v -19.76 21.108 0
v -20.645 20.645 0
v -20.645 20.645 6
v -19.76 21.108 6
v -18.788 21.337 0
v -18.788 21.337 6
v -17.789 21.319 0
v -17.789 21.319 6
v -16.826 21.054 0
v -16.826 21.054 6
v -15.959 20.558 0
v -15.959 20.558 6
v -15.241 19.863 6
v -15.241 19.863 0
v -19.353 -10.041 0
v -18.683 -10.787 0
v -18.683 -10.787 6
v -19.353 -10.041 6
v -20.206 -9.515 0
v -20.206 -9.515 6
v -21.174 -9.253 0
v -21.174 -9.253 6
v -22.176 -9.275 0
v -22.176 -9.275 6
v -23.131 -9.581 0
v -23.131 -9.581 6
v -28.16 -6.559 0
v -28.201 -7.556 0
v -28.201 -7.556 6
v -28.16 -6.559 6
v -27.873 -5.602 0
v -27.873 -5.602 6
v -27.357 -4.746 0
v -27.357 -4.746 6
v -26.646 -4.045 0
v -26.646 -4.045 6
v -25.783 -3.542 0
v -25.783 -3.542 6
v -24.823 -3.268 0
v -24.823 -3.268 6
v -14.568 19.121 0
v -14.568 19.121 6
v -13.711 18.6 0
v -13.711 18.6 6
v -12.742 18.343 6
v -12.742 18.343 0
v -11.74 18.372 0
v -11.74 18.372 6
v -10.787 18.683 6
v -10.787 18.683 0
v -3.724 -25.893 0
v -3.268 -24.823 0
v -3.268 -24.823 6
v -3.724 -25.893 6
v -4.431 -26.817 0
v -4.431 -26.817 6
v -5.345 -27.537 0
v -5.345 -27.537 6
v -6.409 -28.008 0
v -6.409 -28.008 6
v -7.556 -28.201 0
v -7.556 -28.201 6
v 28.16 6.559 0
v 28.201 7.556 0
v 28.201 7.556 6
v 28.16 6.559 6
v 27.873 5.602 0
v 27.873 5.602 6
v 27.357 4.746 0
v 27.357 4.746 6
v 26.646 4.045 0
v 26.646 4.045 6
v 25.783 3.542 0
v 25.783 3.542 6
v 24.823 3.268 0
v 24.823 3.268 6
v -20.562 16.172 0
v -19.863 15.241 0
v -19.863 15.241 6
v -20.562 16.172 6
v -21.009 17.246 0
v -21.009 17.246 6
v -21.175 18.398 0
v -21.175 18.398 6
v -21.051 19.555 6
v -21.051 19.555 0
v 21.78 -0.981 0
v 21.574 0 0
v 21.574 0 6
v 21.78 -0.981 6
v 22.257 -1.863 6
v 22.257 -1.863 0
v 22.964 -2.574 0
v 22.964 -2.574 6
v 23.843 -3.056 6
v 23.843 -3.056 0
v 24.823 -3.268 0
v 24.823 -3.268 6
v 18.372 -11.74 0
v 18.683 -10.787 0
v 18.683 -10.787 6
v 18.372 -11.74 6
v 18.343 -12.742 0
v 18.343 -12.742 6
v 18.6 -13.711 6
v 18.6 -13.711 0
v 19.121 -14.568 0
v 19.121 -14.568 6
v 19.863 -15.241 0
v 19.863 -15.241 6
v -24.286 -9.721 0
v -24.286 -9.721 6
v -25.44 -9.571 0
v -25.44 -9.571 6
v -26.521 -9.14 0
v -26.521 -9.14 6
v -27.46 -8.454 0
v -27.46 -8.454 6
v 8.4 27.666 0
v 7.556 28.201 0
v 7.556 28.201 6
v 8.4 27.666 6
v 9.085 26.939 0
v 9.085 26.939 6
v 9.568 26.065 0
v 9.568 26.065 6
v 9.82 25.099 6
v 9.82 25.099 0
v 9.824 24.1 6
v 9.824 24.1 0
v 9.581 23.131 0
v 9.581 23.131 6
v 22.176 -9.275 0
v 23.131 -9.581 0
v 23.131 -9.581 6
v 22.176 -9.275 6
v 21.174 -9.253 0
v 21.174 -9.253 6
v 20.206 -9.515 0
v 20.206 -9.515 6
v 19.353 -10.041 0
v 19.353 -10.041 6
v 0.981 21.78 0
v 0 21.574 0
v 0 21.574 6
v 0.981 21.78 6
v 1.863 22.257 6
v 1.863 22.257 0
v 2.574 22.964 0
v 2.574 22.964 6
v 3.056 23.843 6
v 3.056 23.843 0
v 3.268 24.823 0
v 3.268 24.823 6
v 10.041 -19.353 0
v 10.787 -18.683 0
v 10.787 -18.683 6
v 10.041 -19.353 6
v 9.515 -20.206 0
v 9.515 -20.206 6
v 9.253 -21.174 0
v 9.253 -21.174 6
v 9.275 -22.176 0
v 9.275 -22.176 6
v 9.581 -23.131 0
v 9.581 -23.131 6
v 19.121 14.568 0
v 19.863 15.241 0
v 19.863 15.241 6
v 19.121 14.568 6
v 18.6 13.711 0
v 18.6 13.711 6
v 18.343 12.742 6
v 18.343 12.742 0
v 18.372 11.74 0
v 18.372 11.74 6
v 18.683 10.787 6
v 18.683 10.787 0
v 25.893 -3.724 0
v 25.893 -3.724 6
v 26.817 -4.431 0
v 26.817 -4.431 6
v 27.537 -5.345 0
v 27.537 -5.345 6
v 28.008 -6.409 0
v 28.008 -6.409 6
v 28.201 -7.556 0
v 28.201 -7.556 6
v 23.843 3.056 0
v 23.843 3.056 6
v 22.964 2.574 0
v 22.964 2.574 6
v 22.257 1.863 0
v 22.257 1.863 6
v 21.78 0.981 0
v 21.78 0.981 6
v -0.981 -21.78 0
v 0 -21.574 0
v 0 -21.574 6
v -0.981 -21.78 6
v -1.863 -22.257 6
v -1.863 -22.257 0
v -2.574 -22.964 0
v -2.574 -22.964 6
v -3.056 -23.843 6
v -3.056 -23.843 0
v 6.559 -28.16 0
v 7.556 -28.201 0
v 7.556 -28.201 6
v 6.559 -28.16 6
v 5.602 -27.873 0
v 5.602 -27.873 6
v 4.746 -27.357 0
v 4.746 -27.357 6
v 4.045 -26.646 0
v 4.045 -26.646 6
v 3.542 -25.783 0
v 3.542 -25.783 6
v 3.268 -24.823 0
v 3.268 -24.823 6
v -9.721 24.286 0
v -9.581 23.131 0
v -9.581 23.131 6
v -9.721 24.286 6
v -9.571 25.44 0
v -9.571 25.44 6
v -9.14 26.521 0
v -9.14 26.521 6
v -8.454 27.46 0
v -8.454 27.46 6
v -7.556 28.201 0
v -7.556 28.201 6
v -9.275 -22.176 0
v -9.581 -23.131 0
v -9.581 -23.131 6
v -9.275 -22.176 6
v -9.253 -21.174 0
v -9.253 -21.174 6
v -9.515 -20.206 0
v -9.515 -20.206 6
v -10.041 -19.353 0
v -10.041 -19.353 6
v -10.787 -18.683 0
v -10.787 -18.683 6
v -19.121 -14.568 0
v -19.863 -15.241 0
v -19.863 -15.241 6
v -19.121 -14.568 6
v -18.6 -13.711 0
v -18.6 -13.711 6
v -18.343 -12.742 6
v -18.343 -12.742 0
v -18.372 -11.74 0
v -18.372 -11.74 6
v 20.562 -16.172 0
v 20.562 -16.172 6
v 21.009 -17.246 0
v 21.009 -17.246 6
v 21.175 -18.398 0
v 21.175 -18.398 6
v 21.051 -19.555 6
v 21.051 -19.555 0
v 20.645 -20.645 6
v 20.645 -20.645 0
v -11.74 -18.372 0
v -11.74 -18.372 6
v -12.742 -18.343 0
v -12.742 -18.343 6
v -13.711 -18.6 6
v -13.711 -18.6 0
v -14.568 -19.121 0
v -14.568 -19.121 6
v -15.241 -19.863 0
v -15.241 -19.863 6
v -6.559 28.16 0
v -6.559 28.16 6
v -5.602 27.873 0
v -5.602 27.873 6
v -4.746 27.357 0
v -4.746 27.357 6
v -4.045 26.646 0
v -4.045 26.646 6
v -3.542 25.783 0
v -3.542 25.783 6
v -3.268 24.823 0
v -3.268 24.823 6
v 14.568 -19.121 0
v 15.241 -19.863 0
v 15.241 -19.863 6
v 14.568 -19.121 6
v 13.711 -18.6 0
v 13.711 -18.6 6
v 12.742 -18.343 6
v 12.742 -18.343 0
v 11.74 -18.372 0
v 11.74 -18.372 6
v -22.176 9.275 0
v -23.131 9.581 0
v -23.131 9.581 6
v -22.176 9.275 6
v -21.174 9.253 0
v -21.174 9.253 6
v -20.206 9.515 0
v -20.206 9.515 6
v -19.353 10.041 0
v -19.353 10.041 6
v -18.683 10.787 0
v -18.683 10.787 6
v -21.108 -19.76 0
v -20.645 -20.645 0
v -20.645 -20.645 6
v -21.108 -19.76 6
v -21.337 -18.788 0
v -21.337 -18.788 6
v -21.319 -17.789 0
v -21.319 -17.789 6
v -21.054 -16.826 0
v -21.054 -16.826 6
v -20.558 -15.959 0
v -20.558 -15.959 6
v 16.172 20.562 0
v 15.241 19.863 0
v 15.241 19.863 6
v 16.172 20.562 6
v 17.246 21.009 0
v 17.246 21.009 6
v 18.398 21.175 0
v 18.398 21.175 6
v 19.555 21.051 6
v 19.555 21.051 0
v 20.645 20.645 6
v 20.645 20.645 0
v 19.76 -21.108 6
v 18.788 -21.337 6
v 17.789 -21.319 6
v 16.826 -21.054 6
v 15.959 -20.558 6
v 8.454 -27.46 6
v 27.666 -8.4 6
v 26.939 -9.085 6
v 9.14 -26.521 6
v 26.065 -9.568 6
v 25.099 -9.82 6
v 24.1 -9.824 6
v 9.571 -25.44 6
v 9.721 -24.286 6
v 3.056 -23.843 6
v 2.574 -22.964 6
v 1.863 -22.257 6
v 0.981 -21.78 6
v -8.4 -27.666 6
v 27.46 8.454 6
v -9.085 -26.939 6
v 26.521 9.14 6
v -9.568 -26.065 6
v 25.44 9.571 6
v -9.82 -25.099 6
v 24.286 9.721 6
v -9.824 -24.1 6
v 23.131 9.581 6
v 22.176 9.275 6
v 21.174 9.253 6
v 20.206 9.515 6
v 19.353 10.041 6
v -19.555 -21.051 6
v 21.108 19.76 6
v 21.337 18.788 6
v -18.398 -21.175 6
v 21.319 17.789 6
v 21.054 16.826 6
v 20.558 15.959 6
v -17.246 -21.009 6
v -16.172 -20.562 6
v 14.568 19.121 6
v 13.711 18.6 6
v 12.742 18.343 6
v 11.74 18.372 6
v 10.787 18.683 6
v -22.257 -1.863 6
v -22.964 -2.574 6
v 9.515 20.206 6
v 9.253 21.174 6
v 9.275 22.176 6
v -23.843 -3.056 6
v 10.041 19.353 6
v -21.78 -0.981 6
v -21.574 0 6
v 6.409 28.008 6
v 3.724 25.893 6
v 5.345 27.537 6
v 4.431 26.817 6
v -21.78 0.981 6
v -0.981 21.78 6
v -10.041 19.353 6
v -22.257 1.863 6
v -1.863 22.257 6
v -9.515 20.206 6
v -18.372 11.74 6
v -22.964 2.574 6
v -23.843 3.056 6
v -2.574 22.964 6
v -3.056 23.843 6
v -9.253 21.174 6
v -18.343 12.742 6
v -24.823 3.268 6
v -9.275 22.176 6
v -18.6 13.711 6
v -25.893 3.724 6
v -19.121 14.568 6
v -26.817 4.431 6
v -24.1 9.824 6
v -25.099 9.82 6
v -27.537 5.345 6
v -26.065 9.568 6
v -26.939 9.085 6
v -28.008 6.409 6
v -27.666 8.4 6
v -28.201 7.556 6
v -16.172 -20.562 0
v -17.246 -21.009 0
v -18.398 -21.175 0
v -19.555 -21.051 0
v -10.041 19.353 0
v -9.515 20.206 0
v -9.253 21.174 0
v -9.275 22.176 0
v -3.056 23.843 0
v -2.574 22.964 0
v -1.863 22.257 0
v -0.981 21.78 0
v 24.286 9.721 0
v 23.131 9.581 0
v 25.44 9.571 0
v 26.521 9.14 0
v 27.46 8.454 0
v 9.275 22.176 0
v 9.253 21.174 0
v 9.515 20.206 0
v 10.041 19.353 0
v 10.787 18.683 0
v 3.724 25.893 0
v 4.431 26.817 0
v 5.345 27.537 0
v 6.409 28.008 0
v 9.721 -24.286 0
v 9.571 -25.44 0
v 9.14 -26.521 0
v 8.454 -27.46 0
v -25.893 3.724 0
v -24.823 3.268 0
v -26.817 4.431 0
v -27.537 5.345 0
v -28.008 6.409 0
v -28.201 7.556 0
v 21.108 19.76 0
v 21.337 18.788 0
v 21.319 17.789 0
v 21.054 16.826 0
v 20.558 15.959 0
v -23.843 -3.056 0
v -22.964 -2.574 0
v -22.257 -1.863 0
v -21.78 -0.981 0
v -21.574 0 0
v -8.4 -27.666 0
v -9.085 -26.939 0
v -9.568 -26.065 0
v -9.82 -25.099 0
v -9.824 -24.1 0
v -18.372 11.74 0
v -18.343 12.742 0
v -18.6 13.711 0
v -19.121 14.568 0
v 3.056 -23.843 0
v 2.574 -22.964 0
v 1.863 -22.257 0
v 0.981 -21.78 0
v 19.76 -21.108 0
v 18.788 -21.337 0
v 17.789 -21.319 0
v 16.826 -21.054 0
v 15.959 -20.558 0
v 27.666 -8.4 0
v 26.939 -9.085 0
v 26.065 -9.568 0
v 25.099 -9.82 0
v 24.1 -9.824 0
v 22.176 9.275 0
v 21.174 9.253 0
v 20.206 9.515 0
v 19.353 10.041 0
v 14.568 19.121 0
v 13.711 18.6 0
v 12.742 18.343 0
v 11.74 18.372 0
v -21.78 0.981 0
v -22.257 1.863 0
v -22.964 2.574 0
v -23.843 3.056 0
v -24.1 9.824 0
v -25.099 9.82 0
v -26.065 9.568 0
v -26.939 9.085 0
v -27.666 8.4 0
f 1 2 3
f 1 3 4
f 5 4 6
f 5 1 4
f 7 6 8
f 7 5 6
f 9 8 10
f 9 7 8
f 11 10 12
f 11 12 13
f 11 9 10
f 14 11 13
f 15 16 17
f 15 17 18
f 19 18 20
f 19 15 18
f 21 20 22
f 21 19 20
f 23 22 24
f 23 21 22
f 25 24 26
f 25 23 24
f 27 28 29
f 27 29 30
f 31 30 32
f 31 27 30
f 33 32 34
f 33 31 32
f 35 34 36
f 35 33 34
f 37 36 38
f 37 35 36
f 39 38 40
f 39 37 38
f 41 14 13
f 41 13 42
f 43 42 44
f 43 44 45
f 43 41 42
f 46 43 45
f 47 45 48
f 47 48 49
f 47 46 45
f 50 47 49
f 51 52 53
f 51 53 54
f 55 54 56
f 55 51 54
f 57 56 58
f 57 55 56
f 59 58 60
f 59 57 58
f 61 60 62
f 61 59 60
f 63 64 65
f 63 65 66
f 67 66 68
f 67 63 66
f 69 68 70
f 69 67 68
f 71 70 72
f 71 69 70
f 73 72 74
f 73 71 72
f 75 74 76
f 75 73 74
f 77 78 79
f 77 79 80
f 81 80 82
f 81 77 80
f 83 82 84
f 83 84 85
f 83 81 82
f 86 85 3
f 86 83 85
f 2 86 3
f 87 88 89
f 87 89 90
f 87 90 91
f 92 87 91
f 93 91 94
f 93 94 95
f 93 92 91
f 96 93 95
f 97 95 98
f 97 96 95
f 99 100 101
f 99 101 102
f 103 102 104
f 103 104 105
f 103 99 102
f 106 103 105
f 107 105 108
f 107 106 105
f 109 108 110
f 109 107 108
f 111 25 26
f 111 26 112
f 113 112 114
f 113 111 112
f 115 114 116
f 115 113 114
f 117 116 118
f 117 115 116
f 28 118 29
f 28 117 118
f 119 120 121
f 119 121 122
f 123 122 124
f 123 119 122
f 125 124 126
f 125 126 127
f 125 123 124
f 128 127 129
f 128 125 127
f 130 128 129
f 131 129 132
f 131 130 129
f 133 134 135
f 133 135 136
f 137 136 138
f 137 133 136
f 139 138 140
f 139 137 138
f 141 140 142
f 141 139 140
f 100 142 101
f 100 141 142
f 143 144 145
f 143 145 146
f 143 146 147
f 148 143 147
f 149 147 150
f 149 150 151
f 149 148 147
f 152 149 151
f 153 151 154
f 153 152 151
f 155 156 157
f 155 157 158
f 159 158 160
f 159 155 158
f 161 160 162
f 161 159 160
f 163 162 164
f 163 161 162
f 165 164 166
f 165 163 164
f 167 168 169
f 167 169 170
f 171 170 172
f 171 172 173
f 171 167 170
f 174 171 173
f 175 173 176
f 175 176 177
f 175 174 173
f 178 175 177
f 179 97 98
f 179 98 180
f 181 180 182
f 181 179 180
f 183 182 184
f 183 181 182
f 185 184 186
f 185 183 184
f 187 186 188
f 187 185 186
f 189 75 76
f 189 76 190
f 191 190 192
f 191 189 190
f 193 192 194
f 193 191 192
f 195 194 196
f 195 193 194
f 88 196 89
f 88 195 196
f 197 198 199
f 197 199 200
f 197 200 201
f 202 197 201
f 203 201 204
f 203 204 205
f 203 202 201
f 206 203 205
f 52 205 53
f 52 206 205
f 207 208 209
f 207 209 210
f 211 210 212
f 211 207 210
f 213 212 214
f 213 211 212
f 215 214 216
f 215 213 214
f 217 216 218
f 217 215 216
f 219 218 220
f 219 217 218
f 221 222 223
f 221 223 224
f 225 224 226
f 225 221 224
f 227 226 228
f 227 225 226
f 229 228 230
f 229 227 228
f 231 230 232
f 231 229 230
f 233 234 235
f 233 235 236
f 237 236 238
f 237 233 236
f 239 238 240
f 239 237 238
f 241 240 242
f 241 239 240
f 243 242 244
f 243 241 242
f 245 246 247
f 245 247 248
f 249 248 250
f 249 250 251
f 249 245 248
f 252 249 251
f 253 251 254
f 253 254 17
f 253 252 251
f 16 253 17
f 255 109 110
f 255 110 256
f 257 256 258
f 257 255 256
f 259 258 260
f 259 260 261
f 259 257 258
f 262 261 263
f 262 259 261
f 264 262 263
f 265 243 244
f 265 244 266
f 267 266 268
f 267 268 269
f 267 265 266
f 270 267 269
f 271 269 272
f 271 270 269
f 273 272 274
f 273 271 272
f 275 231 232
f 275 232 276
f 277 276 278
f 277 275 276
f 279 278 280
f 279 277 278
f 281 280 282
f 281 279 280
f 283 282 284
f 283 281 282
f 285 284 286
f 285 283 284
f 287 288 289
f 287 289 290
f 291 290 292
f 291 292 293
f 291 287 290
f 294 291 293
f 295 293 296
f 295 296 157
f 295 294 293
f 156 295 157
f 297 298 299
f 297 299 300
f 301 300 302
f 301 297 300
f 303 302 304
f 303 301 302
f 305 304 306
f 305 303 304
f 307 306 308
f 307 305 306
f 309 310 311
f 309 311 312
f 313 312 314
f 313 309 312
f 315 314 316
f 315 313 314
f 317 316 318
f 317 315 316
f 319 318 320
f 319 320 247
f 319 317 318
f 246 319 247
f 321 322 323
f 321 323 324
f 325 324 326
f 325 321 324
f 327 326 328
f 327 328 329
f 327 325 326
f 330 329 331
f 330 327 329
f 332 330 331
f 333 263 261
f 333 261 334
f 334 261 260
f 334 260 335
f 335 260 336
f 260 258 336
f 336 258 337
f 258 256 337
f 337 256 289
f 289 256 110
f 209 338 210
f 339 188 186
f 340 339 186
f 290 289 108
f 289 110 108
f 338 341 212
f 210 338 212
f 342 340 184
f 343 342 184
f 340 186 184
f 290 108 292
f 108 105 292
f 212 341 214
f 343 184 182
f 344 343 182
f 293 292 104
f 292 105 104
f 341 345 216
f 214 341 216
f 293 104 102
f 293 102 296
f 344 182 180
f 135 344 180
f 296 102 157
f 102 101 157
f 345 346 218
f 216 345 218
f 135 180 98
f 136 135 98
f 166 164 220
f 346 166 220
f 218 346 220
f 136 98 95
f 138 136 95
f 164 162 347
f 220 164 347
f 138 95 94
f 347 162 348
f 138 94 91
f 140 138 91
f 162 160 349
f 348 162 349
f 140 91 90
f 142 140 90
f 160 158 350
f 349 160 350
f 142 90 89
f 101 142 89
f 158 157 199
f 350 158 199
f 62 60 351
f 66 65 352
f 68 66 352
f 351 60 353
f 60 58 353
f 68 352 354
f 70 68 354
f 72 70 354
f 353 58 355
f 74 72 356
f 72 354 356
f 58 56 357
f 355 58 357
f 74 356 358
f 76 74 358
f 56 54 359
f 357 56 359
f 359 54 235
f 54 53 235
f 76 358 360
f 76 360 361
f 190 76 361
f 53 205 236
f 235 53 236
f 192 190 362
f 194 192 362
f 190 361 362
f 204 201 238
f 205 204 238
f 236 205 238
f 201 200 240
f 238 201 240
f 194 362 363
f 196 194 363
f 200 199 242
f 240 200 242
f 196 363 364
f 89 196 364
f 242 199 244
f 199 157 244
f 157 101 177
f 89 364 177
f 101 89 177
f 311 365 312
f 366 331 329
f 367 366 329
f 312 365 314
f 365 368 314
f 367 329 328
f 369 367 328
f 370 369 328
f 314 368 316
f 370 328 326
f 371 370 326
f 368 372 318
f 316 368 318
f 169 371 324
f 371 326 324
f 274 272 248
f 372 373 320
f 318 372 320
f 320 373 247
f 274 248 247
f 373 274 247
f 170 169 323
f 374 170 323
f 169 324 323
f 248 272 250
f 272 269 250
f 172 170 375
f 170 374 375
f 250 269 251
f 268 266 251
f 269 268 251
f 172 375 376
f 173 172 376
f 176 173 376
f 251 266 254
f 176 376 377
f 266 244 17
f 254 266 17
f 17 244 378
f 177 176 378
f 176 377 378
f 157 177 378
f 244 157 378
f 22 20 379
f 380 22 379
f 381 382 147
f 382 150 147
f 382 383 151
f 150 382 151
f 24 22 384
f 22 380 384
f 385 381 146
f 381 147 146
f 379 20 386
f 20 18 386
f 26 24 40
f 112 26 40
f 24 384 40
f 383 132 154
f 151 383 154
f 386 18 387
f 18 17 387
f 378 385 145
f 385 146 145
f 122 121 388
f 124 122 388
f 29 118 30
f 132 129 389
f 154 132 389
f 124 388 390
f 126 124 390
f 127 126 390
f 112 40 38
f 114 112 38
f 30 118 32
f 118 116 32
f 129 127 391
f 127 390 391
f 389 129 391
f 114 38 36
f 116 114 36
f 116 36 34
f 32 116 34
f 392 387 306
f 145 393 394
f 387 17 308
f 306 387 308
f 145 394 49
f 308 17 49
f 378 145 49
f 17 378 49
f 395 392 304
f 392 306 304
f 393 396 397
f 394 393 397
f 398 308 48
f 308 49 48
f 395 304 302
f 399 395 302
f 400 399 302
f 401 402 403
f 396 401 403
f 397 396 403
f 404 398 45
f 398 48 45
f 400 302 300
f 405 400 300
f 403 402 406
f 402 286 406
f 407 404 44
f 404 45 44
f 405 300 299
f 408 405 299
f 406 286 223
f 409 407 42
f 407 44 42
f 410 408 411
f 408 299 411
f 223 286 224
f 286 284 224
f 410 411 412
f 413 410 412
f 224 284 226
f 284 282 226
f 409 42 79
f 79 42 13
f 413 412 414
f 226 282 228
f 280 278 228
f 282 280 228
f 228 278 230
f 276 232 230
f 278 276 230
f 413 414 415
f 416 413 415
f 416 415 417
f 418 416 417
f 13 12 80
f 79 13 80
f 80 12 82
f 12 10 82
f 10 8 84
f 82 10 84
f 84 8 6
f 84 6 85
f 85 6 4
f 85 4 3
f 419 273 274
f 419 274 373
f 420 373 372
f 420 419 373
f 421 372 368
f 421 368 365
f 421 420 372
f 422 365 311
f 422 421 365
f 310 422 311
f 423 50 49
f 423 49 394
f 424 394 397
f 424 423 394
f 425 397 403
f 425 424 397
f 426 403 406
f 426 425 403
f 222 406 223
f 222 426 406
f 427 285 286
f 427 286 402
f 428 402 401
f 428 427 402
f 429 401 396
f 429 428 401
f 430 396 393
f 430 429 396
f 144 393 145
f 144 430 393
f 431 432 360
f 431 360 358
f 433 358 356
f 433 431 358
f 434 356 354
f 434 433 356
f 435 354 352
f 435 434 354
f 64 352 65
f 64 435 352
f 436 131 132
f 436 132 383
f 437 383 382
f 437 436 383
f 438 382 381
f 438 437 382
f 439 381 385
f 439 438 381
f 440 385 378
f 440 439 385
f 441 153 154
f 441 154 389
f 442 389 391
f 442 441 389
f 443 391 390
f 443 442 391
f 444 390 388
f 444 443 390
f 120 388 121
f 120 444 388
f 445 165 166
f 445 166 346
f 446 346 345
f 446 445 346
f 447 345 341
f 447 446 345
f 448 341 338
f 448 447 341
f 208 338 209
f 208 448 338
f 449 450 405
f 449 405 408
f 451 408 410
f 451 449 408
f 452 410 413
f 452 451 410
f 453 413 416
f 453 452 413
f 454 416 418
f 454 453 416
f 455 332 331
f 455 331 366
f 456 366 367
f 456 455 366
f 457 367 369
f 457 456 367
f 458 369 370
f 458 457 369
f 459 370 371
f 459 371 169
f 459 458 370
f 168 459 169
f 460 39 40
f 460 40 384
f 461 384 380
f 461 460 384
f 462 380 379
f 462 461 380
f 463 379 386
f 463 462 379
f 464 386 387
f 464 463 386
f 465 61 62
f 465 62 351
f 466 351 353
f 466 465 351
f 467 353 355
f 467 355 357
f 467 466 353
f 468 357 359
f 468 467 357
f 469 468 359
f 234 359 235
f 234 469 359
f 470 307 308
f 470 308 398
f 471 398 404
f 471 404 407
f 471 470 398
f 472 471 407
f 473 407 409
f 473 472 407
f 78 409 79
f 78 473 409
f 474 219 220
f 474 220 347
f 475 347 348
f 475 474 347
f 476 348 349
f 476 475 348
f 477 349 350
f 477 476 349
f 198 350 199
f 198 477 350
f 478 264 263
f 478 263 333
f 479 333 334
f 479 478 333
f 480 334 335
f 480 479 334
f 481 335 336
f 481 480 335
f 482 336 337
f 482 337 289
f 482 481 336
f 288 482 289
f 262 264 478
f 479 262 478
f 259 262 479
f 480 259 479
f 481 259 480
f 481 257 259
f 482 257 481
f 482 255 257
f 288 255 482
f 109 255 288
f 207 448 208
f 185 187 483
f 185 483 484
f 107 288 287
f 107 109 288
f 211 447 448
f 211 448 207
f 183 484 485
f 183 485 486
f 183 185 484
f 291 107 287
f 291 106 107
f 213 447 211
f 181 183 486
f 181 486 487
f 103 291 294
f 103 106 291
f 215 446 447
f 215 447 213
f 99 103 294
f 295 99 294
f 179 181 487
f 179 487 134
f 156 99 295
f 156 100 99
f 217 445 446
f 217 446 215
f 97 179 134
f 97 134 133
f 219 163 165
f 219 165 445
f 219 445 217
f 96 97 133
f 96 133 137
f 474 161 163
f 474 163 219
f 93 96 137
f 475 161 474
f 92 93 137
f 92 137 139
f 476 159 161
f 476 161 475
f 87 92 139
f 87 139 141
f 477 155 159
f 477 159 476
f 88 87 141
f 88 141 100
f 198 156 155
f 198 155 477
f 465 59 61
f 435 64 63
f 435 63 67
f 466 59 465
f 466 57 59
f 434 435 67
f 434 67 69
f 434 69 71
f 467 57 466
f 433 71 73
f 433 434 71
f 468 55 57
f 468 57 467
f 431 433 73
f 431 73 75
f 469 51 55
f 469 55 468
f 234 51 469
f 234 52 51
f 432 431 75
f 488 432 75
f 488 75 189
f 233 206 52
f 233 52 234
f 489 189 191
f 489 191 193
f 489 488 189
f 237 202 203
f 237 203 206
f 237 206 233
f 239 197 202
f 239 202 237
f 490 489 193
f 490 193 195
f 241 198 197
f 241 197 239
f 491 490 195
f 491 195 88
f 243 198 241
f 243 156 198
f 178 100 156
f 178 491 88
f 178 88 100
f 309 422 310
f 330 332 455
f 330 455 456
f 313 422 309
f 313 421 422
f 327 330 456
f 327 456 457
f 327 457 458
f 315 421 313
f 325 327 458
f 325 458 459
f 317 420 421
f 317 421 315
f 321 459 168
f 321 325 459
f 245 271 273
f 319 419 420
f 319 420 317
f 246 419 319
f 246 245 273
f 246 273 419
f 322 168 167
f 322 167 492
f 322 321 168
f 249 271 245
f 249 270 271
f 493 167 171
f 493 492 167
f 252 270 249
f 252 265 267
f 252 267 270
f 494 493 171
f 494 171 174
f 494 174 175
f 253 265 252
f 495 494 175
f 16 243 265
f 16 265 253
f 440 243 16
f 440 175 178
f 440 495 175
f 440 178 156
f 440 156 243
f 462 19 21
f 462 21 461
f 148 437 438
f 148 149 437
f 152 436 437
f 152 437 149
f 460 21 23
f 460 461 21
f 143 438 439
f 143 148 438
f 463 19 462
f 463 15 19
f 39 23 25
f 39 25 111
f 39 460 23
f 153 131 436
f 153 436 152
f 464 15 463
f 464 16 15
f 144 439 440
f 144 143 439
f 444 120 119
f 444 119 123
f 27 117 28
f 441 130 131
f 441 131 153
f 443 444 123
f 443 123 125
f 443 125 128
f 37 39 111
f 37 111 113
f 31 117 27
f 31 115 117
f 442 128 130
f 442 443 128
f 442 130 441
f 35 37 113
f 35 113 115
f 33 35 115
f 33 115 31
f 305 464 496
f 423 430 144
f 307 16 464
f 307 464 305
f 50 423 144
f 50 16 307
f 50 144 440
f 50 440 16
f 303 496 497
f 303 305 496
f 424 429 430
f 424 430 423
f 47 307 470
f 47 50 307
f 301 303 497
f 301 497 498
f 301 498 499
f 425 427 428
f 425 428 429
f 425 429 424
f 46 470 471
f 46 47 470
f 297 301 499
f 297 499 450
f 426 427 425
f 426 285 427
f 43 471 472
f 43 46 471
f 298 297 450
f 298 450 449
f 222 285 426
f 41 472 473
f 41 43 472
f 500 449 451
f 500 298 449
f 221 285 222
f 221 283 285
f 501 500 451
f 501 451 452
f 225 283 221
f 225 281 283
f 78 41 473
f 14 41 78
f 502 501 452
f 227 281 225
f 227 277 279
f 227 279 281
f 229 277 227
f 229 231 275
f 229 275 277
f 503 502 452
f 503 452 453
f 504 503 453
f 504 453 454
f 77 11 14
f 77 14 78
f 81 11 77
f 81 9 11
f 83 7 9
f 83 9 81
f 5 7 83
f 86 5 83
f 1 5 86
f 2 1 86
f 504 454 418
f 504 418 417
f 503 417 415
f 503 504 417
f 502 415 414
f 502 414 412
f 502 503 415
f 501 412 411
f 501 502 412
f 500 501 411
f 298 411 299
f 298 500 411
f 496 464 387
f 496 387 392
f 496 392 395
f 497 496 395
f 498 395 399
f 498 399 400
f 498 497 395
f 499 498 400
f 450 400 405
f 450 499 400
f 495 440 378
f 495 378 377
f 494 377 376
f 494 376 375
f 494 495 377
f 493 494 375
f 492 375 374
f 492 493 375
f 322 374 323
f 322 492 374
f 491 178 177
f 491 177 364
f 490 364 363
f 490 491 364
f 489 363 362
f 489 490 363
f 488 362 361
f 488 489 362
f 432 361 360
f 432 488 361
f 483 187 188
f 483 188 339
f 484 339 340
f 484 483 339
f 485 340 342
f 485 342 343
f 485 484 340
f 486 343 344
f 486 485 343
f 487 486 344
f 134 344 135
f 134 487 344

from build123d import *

# Parameters (mm, degrees)
BOSS_EXTRUDE4_DEPTH = 6


with BuildPart() as part:
    # Sketch4 → Boss-Extrude4 (new body)
    with BuildSketch(Plane.XY):
        with BuildLine():
            ThreePointArc((0, 21.573833609), (2.244076515, 22.584556995), (3.267964856, 24.822657492))
            ThreePointArc((3.267964856, 24.822657492), (4.865501824, 27.205902748), (7.556485251, 28.201186884))
            ThreePointArc((7.556485251, 28.201186884), (9.568303086, 26.065235227), (9.581188162, 23.131034405))
            ThreePointArc((9.581188162, 23.131034405), (9.348851227, 20.680838348), (10.786916804, 18.683487962))
            ThreePointArc((10.786916804, 18.683487962), (13.235705768, 18.436761833), (15.24146933, 19.86306955))
            ThreePointArc((15.24146933, 19.86306955), (17.816599556, 21.128252), (20.644701633, 20.644701633))
            ThreePointArc((20.644701633, 20.644701633), (21.319011157, 17.789004319), (19.86306955, 15.24146933))
            ThreePointArc((19.86306955, 15.24146933), (18.436761833, 13.235705768), (18.683487962, 10.786916804))
            ThreePointArc((18.683487962, 10.786916804), (20.680838348, 9.348851227), (23.131034405, 9.581188162))
            ThreePointArc((23.131034405, 9.581188162), (25.993753825, 9.389303192), (28.201186884, 7.556485251))
            ThreePointArc((28.201186884, 7.556485251), (27.357307405, 4.74622407), (24.822657492, 3.267964856))
            ThreePointArc((24.822657492, 3.267964856), (22.584556995, 2.244076515), (21.573833609, 0))
            ThreePointArc((21.573833609, 0), (22.584556995, -2.244076515), (24.822657492, -3.267964856))
            ThreePointArc((24.822657492, -3.267964856), (27.205902748, -4.865501824), (28.201186884, -7.556485251))
            ThreePointArc((28.201186884, -7.556485251), (26.065235227, -9.568303086), (23.131034405, -9.581188162))
            ThreePointArc((23.131034405, -9.581188162), (20.680838348, -9.348851227), (18.683487962, -10.786916804))
            ThreePointArc((18.683487962, -10.786916804), (18.436761833, -13.235705768), (19.86306955, -15.24146933))
            ThreePointArc((19.86306955, -15.24146933), (21.128252, -17.816599556), (20.644701633, -20.644701633))
            ThreePointArc((20.644701633, -20.644701633), (17.789004319, -21.319011157), (15.24146933, -19.86306955))
            ThreePointArc((15.24146933, -19.86306955), (13.235705768, -18.436761833), (10.786916804, -18.683487962))
            ThreePointArc((10.786916804, -18.683487962), (9.348851227, -20.680838348), (9.581188162, -23.131034405))
            ThreePointArc((9.581188162, -23.131034405), (9.389303192, -25.993753825), (7.556485251, -28.201186884))
            ThreePointArc((7.556485251, -28.201186884), (4.74622407, -27.357307405), (3.267964856, -24.822657492))
            ThreePointArc((3.267964856, -24.822657492), (2.244076515, -22.584556995), (0, -21.573833609))
            ThreePointArc((0, -21.573833609), (-2.244076515, -22.584556995), (-3.267964856, -24.822657492))
            ThreePointArc((-3.267964856, -24.822657492), (-4.865501824, -27.205902748), (-7.556485251, -28.201186884))
            ThreePointArc((-7.556485251, -28.201186884), (-9.568303086, -26.065235227), (-9.581188162, -23.131034405))
            ThreePointArc((-9.581188162, -23.131034405), (-9.348851227, -20.680838348), (-10.786916804, -18.683487962))
            ThreePointArc((-10.786916804, -18.683487962), (-13.235705768, -18.436761833), (-15.24146933, -19.86306955))
            ThreePointArc((-15.24146933, -19.86306955), (-17.816599556, -21.128252), (-20.644701633, -20.644701633))
            ThreePointArc((-20.644701633, -20.644701633), (-21.319011157, -17.789004319), (-19.86306955, -15.24146933))
            ThreePointArc((-19.86306955, -15.24146933), (-18.436761833, -13.235705768), (-18.683487962, -10.786916804))
            ThreePointArc((-18.683487962, -10.786916804), (-20.680838348, -9.348851227), (-23.131034405, -9.581188162))
            ThreePointArc((-23.131034405, -9.581188162), (-25.993753825, -9.389303192), (-28.201186884, -7.556485251))
            ThreePointArc((-28.201186884, -7.556485251), (-27.357307405, -4.74622407), (-24.822657492, -3.267964856))
            ThreePointArc((-24.822657492, -3.267964856), (-22.584556995, -2.244076515), (-21.573833609, 0))
            ThreePointArc((-21.573833609, 0), (-22.584556995, 2.244076515), (-24.822657492, 3.267964856))
            ThreePointArc((-24.822657492, 3.267964856), (-27.205902748, 4.865501824), (-28.201186884, 7.556485251))
            ThreePointArc((-28.201186884, 7.556485251), (-26.065235227, 9.568303086), (-23.131034405, 9.581188162))
            ThreePointArc((-23.131034405, 9.581188162), (-20.680838348, 9.348851227), (-18.683487962, 10.786916804))
            ThreePointArc((-18.683487962, 10.786916804), (-18.436761833, 13.235705768), (-19.86306955, 15.24146933))
            ThreePointArc((-19.86306955, 15.24146933), (-21.128252, 17.816599556), (-20.644701633, 20.644701633))
            ThreePointArc((-20.644701633, 20.644701633), (-17.789004319, 21.319011157), (-15.24146933, 19.86306955))
            ThreePointArc((-15.24146933, 19.86306955), (-13.235705768, 18.436761833), (-10.786916804, 18.683487962))
            ThreePointArc((-10.786916804, 18.683487962), (-9.348851227, 20.680838348), (-9.581188162, 23.131034405))
            ThreePointArc((-9.581188162, 23.131034405), (-9.389303192, 25.993753825), (-7.556485251, 28.201186884))
            ThreePointArc((-7.556485251, 28.201186884), (-4.74622407, 27.357307405), (-3.267964856, 24.822657492))
            ThreePointArc((-3.267964856, 24.822657492), (-2.244076515, 22.584556995), (0, 21.573833609))
        make_face()
    extrude(amount=BOSS_EXTRUDE4_DEPTH)


solid = part.part
